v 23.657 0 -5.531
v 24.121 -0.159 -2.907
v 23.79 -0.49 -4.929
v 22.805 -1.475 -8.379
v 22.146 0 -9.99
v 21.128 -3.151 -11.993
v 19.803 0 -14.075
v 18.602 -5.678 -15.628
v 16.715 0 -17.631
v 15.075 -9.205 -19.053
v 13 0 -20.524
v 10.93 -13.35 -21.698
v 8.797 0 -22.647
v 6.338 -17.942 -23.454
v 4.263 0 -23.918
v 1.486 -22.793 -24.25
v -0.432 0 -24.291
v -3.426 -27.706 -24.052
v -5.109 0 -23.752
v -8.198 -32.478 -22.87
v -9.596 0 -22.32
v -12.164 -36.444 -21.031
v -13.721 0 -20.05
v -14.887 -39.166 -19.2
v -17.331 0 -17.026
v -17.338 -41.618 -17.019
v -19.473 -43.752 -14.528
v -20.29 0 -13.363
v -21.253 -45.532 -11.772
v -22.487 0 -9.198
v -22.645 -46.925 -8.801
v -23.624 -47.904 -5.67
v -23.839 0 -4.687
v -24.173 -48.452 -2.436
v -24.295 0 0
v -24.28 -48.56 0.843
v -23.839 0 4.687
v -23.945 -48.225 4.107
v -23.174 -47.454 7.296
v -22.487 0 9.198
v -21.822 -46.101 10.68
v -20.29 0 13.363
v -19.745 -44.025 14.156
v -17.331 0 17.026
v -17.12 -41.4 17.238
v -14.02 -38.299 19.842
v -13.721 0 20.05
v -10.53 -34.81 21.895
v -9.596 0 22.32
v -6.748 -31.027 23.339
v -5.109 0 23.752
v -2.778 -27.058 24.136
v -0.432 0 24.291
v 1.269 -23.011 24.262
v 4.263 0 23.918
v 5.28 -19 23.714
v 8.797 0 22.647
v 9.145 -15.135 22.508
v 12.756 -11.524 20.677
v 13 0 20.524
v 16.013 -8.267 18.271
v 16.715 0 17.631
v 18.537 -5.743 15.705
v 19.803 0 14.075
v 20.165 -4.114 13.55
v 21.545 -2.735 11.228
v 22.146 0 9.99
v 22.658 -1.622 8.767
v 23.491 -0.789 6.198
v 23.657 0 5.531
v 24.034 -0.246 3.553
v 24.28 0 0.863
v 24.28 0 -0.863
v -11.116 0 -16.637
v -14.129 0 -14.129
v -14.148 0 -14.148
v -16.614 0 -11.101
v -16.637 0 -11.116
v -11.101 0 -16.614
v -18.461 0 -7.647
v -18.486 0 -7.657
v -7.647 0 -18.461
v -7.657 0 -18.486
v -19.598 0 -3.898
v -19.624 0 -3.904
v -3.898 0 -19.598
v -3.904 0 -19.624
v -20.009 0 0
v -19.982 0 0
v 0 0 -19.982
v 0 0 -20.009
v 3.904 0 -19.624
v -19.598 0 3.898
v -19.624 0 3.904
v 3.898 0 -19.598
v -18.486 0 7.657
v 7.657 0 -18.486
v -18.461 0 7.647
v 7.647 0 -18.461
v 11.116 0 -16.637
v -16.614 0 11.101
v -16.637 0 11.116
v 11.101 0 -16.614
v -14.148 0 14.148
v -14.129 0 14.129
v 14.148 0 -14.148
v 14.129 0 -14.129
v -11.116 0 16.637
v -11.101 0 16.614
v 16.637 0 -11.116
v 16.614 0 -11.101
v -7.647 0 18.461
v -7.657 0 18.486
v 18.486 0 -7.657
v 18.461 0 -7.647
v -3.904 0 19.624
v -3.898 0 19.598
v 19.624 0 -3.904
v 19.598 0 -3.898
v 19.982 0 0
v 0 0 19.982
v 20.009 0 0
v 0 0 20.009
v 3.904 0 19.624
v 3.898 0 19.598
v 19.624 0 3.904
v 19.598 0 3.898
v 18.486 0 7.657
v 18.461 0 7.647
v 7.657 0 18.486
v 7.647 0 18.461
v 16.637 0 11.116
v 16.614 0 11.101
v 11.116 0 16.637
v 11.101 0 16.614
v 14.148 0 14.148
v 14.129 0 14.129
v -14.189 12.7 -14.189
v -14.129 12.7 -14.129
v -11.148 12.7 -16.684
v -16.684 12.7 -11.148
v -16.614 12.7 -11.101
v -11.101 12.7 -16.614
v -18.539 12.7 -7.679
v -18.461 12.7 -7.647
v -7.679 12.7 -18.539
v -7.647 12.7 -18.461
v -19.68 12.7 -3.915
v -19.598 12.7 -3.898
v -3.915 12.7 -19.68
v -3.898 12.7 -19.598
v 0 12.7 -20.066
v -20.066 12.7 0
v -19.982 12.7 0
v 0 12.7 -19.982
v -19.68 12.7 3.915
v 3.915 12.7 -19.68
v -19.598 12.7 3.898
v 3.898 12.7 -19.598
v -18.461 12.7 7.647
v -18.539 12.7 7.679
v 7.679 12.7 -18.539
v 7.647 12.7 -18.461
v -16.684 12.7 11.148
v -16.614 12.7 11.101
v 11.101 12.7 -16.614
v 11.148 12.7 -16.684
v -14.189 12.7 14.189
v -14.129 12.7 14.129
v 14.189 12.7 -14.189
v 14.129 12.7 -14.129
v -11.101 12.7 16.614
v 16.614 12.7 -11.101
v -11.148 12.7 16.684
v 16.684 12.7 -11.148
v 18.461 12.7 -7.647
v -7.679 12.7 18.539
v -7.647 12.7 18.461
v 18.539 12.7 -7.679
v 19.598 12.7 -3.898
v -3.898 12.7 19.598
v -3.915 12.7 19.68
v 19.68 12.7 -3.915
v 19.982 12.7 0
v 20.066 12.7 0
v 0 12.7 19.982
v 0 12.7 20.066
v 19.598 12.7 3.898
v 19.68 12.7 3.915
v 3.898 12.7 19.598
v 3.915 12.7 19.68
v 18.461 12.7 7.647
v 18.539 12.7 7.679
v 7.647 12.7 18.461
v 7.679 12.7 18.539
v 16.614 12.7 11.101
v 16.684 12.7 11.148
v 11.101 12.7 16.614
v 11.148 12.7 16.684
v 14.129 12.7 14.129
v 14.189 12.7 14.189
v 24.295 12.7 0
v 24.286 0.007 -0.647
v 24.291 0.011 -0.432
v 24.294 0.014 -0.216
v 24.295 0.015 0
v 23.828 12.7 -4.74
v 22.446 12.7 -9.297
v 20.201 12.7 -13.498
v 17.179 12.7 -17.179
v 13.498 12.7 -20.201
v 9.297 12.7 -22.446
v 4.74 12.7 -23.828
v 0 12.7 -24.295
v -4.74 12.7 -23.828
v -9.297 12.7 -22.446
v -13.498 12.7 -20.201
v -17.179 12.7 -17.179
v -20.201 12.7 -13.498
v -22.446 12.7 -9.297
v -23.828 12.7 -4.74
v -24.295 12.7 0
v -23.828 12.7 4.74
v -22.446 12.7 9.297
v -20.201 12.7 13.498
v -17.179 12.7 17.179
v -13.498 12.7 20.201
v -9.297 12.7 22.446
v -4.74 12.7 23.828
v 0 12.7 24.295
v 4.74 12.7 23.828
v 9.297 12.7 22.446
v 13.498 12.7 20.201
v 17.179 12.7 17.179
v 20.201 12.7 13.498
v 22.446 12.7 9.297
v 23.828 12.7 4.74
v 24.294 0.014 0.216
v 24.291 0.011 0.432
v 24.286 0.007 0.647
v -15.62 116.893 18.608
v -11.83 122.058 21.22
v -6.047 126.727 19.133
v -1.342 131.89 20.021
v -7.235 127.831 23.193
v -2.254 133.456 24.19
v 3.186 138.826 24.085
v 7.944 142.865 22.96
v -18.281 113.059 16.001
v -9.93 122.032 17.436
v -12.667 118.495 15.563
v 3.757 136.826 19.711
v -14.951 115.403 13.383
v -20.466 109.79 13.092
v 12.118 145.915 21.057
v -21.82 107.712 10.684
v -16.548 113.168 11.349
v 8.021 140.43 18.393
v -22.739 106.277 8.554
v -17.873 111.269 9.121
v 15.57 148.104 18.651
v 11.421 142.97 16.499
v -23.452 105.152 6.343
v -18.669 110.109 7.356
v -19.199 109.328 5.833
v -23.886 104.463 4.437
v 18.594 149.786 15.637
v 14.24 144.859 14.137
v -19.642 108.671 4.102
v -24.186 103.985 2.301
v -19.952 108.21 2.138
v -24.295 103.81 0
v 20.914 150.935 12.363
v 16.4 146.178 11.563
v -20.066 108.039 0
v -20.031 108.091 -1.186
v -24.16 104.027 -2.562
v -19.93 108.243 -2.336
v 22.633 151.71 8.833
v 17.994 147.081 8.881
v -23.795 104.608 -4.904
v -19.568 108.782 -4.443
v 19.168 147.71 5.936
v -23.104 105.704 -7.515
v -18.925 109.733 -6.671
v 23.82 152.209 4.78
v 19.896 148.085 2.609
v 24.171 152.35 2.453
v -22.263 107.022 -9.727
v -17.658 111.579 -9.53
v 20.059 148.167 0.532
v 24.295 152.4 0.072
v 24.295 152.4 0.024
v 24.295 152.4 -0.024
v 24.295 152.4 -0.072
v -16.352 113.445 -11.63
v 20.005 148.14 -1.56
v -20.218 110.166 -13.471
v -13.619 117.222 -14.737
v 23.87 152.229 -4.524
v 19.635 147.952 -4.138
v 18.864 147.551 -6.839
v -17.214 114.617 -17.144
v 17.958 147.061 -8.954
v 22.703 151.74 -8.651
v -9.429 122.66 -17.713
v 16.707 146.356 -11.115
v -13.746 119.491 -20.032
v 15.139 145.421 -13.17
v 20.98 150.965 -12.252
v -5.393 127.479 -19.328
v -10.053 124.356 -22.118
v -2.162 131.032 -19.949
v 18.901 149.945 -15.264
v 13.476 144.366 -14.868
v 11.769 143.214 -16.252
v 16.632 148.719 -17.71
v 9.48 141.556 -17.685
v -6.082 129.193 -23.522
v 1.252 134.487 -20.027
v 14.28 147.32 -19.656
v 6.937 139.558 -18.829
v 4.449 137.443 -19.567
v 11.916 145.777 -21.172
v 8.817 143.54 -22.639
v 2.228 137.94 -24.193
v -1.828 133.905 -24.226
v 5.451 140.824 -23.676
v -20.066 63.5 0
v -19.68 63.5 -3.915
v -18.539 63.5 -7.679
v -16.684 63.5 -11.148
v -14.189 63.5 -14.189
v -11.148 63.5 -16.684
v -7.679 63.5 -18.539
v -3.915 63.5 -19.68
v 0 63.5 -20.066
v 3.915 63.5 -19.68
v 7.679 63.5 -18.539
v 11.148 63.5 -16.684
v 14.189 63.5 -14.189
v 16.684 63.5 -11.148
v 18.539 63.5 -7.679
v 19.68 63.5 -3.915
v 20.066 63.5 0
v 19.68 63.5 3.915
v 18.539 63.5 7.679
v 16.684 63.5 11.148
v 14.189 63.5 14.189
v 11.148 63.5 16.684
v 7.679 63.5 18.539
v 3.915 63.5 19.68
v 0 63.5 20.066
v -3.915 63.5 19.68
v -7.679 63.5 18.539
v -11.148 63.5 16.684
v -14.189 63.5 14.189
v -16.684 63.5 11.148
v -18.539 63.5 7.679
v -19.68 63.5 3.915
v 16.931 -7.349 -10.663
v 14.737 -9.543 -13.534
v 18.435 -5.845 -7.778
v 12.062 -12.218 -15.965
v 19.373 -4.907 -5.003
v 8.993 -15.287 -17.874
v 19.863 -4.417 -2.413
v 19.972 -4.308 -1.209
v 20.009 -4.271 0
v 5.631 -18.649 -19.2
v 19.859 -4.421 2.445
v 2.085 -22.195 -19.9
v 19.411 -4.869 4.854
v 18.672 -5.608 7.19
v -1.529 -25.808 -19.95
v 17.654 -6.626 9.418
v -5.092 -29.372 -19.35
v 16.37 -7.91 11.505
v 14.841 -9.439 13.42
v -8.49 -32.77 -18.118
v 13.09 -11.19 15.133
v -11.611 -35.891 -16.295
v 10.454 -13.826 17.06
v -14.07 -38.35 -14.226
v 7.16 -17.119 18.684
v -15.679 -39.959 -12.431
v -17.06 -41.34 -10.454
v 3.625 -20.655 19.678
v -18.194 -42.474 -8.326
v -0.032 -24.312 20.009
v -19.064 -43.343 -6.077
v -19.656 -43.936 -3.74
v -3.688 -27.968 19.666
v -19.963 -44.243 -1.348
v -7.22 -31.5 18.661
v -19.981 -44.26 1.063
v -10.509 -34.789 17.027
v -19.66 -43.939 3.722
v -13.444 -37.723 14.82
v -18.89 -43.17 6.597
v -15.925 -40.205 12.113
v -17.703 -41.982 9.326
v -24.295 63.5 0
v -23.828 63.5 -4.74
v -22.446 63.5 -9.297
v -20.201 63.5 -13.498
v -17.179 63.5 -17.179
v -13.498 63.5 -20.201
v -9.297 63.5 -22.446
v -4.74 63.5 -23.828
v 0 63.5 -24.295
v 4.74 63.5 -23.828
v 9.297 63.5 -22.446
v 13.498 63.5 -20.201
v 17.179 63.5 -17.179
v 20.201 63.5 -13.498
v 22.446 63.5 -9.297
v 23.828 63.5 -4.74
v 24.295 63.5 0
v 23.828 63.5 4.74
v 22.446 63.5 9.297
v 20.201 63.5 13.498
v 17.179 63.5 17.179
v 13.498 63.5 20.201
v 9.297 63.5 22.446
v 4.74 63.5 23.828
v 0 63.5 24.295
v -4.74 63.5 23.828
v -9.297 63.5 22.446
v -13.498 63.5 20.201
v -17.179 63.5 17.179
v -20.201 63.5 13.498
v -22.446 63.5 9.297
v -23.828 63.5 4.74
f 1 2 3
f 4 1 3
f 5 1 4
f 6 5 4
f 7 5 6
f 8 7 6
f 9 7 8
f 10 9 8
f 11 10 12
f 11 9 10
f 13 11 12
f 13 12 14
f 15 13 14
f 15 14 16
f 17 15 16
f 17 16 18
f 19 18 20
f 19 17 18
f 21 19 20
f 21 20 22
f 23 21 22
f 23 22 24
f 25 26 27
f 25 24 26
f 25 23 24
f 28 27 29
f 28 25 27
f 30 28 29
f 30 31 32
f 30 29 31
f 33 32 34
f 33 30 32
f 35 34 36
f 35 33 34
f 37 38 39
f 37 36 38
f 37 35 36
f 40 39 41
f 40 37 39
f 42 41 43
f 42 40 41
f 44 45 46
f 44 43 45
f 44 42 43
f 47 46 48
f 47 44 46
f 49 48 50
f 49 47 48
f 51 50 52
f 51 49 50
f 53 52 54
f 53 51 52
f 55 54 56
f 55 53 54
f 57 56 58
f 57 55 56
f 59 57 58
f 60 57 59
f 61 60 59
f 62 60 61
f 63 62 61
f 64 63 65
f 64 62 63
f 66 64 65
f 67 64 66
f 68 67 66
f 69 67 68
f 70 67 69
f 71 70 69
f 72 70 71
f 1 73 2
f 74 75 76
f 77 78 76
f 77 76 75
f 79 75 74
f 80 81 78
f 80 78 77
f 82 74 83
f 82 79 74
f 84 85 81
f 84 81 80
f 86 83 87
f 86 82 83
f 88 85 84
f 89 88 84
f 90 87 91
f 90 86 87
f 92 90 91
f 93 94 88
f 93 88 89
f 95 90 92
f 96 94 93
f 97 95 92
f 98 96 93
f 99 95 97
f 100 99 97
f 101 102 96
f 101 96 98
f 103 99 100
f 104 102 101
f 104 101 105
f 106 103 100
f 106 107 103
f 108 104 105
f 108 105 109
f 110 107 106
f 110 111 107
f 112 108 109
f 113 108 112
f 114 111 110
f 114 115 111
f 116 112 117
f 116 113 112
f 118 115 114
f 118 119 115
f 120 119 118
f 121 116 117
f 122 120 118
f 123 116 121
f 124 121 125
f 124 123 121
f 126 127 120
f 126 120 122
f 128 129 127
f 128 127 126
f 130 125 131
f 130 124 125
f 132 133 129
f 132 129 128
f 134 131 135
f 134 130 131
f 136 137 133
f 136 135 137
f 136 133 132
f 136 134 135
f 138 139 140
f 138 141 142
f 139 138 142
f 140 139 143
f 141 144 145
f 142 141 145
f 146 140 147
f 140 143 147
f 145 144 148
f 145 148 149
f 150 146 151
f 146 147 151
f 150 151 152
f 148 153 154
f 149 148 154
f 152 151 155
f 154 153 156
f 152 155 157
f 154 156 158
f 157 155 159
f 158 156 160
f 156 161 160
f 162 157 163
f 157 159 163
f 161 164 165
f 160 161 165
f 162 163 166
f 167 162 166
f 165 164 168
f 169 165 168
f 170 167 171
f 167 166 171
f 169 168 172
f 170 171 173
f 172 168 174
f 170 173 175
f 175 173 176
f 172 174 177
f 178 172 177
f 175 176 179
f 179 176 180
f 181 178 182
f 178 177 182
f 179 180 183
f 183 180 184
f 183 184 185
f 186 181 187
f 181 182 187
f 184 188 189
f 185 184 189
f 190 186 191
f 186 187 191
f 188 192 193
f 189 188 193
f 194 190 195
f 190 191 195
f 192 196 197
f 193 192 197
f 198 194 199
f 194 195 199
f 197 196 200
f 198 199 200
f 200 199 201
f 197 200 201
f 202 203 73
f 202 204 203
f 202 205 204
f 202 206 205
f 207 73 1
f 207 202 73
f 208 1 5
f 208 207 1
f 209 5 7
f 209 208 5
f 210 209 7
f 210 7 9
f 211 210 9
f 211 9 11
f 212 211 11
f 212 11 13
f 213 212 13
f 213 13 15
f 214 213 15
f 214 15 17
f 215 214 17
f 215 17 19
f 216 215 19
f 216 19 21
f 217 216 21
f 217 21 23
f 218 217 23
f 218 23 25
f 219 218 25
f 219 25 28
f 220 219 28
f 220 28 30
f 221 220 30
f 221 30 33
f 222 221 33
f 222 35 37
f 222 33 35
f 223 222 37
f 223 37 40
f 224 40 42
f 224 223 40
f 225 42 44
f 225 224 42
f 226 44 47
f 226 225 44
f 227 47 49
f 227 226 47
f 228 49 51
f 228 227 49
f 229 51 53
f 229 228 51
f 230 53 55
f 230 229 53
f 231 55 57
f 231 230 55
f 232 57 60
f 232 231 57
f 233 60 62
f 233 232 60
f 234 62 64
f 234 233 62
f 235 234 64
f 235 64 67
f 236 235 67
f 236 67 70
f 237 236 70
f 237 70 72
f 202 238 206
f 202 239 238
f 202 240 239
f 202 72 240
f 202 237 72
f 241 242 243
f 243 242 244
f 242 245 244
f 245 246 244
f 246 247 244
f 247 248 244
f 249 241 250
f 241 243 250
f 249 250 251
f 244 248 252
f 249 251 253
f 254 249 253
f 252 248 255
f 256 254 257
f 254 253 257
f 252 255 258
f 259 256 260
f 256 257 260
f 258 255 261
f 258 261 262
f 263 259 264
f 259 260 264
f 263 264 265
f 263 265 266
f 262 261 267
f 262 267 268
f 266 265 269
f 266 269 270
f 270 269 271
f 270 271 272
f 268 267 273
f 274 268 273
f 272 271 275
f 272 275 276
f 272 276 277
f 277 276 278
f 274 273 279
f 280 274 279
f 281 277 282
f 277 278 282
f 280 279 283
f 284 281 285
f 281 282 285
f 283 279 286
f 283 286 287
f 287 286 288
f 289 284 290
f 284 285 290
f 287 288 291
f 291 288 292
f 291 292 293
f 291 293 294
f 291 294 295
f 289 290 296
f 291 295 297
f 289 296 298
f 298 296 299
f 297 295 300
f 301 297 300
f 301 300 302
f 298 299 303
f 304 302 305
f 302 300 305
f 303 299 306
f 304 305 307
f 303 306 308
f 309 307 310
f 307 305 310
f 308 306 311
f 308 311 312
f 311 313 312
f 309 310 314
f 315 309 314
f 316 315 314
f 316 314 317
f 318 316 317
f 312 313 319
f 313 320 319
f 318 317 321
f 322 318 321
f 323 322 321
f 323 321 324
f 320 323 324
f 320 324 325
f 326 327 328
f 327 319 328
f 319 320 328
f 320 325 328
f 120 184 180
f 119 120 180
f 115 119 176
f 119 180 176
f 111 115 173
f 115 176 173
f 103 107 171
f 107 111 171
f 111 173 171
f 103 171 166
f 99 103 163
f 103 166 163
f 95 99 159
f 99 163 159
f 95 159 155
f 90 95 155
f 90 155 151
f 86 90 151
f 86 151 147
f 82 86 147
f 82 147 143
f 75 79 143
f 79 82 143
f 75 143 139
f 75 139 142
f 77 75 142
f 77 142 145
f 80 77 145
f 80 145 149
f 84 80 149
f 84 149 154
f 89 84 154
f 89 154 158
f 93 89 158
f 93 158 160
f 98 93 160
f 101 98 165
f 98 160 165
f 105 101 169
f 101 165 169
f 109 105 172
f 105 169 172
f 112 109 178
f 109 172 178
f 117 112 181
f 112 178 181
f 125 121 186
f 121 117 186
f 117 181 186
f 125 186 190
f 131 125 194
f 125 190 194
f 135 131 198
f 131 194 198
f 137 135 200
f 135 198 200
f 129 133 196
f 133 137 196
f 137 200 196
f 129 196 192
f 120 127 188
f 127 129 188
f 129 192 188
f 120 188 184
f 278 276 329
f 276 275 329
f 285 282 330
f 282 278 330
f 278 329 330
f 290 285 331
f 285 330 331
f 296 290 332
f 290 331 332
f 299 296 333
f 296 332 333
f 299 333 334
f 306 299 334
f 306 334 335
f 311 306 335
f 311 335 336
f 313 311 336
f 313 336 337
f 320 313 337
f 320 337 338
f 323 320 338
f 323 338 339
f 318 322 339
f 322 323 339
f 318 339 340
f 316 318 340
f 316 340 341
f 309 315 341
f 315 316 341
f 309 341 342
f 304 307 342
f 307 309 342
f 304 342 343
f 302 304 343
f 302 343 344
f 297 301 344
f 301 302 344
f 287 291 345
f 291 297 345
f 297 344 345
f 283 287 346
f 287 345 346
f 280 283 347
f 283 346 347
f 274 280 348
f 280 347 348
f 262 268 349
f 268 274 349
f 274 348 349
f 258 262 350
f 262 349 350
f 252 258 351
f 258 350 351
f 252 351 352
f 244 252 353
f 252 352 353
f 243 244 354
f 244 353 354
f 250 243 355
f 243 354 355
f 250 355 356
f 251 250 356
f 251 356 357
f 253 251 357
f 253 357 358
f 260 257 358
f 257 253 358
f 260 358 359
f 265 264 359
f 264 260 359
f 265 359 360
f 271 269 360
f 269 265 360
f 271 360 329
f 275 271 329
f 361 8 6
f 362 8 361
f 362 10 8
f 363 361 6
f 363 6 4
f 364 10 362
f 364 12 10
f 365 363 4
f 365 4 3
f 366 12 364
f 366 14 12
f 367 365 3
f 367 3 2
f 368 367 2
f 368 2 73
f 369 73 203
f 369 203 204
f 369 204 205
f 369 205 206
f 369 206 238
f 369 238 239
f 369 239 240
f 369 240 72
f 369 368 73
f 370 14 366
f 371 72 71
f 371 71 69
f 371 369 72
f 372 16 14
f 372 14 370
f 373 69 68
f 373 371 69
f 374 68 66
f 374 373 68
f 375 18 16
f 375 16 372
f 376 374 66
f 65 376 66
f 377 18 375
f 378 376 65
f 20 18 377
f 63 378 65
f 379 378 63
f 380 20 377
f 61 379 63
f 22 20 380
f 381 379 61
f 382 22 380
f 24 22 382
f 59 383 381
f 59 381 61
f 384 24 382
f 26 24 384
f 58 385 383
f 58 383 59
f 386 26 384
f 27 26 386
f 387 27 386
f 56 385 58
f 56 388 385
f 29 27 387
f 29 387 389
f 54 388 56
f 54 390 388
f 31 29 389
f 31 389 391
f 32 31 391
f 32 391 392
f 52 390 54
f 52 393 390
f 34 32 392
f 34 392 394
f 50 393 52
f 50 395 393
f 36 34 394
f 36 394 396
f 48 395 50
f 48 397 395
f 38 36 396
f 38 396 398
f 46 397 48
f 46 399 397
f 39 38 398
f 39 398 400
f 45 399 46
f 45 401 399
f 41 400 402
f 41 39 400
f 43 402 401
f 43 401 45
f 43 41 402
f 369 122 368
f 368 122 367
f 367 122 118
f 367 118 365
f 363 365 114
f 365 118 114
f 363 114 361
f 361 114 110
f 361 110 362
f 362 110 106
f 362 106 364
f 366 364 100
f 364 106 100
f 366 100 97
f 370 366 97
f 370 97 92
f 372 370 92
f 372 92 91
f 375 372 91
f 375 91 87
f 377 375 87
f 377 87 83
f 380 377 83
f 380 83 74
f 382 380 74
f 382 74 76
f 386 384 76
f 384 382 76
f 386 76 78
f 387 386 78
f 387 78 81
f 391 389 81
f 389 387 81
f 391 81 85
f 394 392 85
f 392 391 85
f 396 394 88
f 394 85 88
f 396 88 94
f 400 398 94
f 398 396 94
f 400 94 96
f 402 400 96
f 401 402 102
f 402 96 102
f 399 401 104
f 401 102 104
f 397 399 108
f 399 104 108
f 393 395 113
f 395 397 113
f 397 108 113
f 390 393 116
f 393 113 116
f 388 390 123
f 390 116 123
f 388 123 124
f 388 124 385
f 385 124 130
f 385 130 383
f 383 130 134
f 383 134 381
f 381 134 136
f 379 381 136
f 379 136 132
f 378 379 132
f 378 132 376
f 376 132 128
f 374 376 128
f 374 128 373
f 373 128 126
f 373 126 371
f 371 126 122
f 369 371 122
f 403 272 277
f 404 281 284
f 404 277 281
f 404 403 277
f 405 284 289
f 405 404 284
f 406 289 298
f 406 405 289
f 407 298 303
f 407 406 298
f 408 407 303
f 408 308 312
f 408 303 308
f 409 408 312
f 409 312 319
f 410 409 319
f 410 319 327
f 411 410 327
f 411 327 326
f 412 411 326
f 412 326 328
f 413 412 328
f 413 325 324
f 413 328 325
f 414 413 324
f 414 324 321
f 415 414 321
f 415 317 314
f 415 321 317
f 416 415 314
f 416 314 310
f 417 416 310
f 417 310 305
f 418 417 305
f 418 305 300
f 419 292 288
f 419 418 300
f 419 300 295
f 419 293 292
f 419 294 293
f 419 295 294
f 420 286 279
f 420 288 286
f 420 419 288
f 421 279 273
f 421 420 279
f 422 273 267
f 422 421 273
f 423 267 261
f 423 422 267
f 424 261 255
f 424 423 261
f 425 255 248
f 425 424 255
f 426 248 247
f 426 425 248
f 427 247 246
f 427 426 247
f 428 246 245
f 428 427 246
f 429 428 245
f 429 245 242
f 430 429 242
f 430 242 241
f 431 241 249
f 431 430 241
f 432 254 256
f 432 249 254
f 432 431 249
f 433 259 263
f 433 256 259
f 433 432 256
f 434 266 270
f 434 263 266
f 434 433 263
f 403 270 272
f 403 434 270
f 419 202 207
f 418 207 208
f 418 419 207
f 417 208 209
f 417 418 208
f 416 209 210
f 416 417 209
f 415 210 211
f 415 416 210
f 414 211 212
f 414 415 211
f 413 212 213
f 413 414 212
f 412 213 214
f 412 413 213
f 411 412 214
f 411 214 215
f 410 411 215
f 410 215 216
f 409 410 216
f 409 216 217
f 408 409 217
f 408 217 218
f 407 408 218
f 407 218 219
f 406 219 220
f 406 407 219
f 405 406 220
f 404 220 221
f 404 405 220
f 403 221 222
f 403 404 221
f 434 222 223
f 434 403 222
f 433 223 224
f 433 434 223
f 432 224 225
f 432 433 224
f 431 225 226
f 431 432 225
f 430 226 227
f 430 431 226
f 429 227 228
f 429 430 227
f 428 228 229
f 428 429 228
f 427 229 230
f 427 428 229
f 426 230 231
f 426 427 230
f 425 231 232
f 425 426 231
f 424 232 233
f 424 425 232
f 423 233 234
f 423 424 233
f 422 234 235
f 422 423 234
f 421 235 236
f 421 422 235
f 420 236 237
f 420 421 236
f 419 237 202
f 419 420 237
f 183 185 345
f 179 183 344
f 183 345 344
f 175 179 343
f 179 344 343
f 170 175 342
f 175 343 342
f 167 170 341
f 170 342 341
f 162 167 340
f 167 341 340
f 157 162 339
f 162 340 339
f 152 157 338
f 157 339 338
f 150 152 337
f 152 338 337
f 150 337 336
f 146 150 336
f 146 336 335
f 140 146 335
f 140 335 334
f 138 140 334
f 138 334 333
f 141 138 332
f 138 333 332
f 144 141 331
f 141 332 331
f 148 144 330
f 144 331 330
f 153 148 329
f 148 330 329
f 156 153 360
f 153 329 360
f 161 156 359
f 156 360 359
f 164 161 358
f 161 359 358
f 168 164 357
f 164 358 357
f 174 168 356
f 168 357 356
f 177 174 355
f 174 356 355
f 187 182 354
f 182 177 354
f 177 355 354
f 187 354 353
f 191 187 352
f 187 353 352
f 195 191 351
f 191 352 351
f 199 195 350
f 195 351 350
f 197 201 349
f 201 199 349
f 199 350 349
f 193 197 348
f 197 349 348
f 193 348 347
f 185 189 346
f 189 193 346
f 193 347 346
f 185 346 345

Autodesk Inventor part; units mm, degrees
sketch "Sketch1" plane through (0, 0, 0) normal (0, 1, 0) x (-1, 0, 0)
  circle A0 centre (0, 0) radius 20.066
  circle A1 centre (0, 0) radius 24.2951
  dimension "d0" = 40.132
  dimension "d1" = 48.5902
extrude "Extrusion1" add sketch "Sketch1" along normal blind 152.4
ref_plane "Work Plane4" through (15.0868, 167.4868, 0) normal (0.7071068, 0.7071068, 0) x (0, 0, -1)
ref_plane "Work Plane3" through (0, 152.4, 0) normal (0.7071068, 0.7071068, 0) x (0, 0, -1)
sketch "Sketch2" plane through (15.0868, 167.4868, 0) normal (0.7071068, 0.7071068, 0) x (0, 0, -1)
  ellipse E0 centre (0, 0) end of major axis (24.2951, 0) minor radius 17.1792 projected
  line L0 (0, -17.1792) -> (46.559, -17.1792)
  line L1 (0, -17.1792) -> (-63.5901, -17.1792)
  line L2 (0, -17.1792) -> (0, 39.92)
  line L3 (0, 39.92) -> (57.0992, 39.92)
  arc A0 (-57.0992, 39.92) -> (57.0992, 39.92) centre (0, 39.92) ccw
  line L4 (57.0992, 39.92) -> (-57.0992, 39.92)
  point P0 (0, -107.7631)
  dimension "d6" = 57.0992
  dimension "d7" = 57.0992
  dimension "d8" = 114.1984
extrude "Extrusion2" cut sketch "Sketch2" against normal blind 152.4
sketch "Sketch3" plane through (0, 0, 0) normal (0, -1, 0) x (1, 0, 0)
  circle A0 centre (0, 0) radius 77.6216
extrude "Extrusion3" cut sketch "Sketch3" against normal blind 63.5
sketch "Sketch4" plane through (0, 63.5, 0) normal (0, -1, 0) x (1, 0, 0)
  circle A0 centre (0, 0) radius 20.066
  circle A1 centre (0, 0) radius 24.2951
extrude "Extrusion4" add sketch "Sketch4" along normal blind 50.8
sketch "Sketch5" plane through (0, 12.7, 0) normal (0, -1, 0) x (1, 0, 0)
  circle A0 centre (0, 0) radius 19.9816
  circle A1 centre (0, 0) radius 24.2951
extrude "Extrusion5" add sketch "Sketch5" along normal blind 12.7
ref_plane "Work Plane5" through (0, 0, 0) normal (-0.7071068, -0.7071068, 0) x (0, 0, -1)
ref_plane "Work Plane6" through (0, 0, 0) normal (-0.7071068, -0.7071068, 0) x (0, 0, -1)
ref_plane "Work Plane9" through (12.1413, -12.1413, 0) normal (0.7071068, -0.7071068, 0) x (0, 0, 1)
ref_plane "Work Plane8" through (-12.1413, 12.1413, 0) normal (0.7071068, -0.7071068, 0) x (0, 0, 1)
sketch "Sketch6" plane through (0, 0, 0) normal (0, -1, 0) x (1, 0, 0)
  circle A0 centre (0, 0) radius 20.0088
  circle A1 centre (0, 0) radius 24.2951
extrude "Extrusion6" add sketch "Sketch6" along normal blind 50.8
sketch "Sketch7" plane through (12.1413, -12.1413, 0) normal (0.7071068, -0.7071068, 0) x (0, 0, 1)
  line L0 (26.0117, 61.2493) -> (-25.7555, 61.2493)
  line L1 (-25.7555, 61.2493) -> (-25.7555, -22.8083)
  line L2 (-25.7555, -22.8083) -> (26.0117, -22.8083)
  line L3 (26.0117, -22.8083) -> (26.0117, 61.2493)
  point P0 (0, 0)
extrude "Extrusion7" cut sketch "Sketch7" along normal blind 50.8
ref_plane "Work Plane1" through (0, 76.2, 0) normal (0, 1, 0) x (1, 0, 0)
ref_plane "Work Plane2" through (0, 152.4, 0) normal (0, 1, 0) x (1, 0, 0)
ref_plane "Work Plane7" through (0, 0, 0) normal (0.7071068, -0.7071068, 0) x (0, 0, 1)
properties part number "Angled Pipe (Attached to Control Pipe)"
